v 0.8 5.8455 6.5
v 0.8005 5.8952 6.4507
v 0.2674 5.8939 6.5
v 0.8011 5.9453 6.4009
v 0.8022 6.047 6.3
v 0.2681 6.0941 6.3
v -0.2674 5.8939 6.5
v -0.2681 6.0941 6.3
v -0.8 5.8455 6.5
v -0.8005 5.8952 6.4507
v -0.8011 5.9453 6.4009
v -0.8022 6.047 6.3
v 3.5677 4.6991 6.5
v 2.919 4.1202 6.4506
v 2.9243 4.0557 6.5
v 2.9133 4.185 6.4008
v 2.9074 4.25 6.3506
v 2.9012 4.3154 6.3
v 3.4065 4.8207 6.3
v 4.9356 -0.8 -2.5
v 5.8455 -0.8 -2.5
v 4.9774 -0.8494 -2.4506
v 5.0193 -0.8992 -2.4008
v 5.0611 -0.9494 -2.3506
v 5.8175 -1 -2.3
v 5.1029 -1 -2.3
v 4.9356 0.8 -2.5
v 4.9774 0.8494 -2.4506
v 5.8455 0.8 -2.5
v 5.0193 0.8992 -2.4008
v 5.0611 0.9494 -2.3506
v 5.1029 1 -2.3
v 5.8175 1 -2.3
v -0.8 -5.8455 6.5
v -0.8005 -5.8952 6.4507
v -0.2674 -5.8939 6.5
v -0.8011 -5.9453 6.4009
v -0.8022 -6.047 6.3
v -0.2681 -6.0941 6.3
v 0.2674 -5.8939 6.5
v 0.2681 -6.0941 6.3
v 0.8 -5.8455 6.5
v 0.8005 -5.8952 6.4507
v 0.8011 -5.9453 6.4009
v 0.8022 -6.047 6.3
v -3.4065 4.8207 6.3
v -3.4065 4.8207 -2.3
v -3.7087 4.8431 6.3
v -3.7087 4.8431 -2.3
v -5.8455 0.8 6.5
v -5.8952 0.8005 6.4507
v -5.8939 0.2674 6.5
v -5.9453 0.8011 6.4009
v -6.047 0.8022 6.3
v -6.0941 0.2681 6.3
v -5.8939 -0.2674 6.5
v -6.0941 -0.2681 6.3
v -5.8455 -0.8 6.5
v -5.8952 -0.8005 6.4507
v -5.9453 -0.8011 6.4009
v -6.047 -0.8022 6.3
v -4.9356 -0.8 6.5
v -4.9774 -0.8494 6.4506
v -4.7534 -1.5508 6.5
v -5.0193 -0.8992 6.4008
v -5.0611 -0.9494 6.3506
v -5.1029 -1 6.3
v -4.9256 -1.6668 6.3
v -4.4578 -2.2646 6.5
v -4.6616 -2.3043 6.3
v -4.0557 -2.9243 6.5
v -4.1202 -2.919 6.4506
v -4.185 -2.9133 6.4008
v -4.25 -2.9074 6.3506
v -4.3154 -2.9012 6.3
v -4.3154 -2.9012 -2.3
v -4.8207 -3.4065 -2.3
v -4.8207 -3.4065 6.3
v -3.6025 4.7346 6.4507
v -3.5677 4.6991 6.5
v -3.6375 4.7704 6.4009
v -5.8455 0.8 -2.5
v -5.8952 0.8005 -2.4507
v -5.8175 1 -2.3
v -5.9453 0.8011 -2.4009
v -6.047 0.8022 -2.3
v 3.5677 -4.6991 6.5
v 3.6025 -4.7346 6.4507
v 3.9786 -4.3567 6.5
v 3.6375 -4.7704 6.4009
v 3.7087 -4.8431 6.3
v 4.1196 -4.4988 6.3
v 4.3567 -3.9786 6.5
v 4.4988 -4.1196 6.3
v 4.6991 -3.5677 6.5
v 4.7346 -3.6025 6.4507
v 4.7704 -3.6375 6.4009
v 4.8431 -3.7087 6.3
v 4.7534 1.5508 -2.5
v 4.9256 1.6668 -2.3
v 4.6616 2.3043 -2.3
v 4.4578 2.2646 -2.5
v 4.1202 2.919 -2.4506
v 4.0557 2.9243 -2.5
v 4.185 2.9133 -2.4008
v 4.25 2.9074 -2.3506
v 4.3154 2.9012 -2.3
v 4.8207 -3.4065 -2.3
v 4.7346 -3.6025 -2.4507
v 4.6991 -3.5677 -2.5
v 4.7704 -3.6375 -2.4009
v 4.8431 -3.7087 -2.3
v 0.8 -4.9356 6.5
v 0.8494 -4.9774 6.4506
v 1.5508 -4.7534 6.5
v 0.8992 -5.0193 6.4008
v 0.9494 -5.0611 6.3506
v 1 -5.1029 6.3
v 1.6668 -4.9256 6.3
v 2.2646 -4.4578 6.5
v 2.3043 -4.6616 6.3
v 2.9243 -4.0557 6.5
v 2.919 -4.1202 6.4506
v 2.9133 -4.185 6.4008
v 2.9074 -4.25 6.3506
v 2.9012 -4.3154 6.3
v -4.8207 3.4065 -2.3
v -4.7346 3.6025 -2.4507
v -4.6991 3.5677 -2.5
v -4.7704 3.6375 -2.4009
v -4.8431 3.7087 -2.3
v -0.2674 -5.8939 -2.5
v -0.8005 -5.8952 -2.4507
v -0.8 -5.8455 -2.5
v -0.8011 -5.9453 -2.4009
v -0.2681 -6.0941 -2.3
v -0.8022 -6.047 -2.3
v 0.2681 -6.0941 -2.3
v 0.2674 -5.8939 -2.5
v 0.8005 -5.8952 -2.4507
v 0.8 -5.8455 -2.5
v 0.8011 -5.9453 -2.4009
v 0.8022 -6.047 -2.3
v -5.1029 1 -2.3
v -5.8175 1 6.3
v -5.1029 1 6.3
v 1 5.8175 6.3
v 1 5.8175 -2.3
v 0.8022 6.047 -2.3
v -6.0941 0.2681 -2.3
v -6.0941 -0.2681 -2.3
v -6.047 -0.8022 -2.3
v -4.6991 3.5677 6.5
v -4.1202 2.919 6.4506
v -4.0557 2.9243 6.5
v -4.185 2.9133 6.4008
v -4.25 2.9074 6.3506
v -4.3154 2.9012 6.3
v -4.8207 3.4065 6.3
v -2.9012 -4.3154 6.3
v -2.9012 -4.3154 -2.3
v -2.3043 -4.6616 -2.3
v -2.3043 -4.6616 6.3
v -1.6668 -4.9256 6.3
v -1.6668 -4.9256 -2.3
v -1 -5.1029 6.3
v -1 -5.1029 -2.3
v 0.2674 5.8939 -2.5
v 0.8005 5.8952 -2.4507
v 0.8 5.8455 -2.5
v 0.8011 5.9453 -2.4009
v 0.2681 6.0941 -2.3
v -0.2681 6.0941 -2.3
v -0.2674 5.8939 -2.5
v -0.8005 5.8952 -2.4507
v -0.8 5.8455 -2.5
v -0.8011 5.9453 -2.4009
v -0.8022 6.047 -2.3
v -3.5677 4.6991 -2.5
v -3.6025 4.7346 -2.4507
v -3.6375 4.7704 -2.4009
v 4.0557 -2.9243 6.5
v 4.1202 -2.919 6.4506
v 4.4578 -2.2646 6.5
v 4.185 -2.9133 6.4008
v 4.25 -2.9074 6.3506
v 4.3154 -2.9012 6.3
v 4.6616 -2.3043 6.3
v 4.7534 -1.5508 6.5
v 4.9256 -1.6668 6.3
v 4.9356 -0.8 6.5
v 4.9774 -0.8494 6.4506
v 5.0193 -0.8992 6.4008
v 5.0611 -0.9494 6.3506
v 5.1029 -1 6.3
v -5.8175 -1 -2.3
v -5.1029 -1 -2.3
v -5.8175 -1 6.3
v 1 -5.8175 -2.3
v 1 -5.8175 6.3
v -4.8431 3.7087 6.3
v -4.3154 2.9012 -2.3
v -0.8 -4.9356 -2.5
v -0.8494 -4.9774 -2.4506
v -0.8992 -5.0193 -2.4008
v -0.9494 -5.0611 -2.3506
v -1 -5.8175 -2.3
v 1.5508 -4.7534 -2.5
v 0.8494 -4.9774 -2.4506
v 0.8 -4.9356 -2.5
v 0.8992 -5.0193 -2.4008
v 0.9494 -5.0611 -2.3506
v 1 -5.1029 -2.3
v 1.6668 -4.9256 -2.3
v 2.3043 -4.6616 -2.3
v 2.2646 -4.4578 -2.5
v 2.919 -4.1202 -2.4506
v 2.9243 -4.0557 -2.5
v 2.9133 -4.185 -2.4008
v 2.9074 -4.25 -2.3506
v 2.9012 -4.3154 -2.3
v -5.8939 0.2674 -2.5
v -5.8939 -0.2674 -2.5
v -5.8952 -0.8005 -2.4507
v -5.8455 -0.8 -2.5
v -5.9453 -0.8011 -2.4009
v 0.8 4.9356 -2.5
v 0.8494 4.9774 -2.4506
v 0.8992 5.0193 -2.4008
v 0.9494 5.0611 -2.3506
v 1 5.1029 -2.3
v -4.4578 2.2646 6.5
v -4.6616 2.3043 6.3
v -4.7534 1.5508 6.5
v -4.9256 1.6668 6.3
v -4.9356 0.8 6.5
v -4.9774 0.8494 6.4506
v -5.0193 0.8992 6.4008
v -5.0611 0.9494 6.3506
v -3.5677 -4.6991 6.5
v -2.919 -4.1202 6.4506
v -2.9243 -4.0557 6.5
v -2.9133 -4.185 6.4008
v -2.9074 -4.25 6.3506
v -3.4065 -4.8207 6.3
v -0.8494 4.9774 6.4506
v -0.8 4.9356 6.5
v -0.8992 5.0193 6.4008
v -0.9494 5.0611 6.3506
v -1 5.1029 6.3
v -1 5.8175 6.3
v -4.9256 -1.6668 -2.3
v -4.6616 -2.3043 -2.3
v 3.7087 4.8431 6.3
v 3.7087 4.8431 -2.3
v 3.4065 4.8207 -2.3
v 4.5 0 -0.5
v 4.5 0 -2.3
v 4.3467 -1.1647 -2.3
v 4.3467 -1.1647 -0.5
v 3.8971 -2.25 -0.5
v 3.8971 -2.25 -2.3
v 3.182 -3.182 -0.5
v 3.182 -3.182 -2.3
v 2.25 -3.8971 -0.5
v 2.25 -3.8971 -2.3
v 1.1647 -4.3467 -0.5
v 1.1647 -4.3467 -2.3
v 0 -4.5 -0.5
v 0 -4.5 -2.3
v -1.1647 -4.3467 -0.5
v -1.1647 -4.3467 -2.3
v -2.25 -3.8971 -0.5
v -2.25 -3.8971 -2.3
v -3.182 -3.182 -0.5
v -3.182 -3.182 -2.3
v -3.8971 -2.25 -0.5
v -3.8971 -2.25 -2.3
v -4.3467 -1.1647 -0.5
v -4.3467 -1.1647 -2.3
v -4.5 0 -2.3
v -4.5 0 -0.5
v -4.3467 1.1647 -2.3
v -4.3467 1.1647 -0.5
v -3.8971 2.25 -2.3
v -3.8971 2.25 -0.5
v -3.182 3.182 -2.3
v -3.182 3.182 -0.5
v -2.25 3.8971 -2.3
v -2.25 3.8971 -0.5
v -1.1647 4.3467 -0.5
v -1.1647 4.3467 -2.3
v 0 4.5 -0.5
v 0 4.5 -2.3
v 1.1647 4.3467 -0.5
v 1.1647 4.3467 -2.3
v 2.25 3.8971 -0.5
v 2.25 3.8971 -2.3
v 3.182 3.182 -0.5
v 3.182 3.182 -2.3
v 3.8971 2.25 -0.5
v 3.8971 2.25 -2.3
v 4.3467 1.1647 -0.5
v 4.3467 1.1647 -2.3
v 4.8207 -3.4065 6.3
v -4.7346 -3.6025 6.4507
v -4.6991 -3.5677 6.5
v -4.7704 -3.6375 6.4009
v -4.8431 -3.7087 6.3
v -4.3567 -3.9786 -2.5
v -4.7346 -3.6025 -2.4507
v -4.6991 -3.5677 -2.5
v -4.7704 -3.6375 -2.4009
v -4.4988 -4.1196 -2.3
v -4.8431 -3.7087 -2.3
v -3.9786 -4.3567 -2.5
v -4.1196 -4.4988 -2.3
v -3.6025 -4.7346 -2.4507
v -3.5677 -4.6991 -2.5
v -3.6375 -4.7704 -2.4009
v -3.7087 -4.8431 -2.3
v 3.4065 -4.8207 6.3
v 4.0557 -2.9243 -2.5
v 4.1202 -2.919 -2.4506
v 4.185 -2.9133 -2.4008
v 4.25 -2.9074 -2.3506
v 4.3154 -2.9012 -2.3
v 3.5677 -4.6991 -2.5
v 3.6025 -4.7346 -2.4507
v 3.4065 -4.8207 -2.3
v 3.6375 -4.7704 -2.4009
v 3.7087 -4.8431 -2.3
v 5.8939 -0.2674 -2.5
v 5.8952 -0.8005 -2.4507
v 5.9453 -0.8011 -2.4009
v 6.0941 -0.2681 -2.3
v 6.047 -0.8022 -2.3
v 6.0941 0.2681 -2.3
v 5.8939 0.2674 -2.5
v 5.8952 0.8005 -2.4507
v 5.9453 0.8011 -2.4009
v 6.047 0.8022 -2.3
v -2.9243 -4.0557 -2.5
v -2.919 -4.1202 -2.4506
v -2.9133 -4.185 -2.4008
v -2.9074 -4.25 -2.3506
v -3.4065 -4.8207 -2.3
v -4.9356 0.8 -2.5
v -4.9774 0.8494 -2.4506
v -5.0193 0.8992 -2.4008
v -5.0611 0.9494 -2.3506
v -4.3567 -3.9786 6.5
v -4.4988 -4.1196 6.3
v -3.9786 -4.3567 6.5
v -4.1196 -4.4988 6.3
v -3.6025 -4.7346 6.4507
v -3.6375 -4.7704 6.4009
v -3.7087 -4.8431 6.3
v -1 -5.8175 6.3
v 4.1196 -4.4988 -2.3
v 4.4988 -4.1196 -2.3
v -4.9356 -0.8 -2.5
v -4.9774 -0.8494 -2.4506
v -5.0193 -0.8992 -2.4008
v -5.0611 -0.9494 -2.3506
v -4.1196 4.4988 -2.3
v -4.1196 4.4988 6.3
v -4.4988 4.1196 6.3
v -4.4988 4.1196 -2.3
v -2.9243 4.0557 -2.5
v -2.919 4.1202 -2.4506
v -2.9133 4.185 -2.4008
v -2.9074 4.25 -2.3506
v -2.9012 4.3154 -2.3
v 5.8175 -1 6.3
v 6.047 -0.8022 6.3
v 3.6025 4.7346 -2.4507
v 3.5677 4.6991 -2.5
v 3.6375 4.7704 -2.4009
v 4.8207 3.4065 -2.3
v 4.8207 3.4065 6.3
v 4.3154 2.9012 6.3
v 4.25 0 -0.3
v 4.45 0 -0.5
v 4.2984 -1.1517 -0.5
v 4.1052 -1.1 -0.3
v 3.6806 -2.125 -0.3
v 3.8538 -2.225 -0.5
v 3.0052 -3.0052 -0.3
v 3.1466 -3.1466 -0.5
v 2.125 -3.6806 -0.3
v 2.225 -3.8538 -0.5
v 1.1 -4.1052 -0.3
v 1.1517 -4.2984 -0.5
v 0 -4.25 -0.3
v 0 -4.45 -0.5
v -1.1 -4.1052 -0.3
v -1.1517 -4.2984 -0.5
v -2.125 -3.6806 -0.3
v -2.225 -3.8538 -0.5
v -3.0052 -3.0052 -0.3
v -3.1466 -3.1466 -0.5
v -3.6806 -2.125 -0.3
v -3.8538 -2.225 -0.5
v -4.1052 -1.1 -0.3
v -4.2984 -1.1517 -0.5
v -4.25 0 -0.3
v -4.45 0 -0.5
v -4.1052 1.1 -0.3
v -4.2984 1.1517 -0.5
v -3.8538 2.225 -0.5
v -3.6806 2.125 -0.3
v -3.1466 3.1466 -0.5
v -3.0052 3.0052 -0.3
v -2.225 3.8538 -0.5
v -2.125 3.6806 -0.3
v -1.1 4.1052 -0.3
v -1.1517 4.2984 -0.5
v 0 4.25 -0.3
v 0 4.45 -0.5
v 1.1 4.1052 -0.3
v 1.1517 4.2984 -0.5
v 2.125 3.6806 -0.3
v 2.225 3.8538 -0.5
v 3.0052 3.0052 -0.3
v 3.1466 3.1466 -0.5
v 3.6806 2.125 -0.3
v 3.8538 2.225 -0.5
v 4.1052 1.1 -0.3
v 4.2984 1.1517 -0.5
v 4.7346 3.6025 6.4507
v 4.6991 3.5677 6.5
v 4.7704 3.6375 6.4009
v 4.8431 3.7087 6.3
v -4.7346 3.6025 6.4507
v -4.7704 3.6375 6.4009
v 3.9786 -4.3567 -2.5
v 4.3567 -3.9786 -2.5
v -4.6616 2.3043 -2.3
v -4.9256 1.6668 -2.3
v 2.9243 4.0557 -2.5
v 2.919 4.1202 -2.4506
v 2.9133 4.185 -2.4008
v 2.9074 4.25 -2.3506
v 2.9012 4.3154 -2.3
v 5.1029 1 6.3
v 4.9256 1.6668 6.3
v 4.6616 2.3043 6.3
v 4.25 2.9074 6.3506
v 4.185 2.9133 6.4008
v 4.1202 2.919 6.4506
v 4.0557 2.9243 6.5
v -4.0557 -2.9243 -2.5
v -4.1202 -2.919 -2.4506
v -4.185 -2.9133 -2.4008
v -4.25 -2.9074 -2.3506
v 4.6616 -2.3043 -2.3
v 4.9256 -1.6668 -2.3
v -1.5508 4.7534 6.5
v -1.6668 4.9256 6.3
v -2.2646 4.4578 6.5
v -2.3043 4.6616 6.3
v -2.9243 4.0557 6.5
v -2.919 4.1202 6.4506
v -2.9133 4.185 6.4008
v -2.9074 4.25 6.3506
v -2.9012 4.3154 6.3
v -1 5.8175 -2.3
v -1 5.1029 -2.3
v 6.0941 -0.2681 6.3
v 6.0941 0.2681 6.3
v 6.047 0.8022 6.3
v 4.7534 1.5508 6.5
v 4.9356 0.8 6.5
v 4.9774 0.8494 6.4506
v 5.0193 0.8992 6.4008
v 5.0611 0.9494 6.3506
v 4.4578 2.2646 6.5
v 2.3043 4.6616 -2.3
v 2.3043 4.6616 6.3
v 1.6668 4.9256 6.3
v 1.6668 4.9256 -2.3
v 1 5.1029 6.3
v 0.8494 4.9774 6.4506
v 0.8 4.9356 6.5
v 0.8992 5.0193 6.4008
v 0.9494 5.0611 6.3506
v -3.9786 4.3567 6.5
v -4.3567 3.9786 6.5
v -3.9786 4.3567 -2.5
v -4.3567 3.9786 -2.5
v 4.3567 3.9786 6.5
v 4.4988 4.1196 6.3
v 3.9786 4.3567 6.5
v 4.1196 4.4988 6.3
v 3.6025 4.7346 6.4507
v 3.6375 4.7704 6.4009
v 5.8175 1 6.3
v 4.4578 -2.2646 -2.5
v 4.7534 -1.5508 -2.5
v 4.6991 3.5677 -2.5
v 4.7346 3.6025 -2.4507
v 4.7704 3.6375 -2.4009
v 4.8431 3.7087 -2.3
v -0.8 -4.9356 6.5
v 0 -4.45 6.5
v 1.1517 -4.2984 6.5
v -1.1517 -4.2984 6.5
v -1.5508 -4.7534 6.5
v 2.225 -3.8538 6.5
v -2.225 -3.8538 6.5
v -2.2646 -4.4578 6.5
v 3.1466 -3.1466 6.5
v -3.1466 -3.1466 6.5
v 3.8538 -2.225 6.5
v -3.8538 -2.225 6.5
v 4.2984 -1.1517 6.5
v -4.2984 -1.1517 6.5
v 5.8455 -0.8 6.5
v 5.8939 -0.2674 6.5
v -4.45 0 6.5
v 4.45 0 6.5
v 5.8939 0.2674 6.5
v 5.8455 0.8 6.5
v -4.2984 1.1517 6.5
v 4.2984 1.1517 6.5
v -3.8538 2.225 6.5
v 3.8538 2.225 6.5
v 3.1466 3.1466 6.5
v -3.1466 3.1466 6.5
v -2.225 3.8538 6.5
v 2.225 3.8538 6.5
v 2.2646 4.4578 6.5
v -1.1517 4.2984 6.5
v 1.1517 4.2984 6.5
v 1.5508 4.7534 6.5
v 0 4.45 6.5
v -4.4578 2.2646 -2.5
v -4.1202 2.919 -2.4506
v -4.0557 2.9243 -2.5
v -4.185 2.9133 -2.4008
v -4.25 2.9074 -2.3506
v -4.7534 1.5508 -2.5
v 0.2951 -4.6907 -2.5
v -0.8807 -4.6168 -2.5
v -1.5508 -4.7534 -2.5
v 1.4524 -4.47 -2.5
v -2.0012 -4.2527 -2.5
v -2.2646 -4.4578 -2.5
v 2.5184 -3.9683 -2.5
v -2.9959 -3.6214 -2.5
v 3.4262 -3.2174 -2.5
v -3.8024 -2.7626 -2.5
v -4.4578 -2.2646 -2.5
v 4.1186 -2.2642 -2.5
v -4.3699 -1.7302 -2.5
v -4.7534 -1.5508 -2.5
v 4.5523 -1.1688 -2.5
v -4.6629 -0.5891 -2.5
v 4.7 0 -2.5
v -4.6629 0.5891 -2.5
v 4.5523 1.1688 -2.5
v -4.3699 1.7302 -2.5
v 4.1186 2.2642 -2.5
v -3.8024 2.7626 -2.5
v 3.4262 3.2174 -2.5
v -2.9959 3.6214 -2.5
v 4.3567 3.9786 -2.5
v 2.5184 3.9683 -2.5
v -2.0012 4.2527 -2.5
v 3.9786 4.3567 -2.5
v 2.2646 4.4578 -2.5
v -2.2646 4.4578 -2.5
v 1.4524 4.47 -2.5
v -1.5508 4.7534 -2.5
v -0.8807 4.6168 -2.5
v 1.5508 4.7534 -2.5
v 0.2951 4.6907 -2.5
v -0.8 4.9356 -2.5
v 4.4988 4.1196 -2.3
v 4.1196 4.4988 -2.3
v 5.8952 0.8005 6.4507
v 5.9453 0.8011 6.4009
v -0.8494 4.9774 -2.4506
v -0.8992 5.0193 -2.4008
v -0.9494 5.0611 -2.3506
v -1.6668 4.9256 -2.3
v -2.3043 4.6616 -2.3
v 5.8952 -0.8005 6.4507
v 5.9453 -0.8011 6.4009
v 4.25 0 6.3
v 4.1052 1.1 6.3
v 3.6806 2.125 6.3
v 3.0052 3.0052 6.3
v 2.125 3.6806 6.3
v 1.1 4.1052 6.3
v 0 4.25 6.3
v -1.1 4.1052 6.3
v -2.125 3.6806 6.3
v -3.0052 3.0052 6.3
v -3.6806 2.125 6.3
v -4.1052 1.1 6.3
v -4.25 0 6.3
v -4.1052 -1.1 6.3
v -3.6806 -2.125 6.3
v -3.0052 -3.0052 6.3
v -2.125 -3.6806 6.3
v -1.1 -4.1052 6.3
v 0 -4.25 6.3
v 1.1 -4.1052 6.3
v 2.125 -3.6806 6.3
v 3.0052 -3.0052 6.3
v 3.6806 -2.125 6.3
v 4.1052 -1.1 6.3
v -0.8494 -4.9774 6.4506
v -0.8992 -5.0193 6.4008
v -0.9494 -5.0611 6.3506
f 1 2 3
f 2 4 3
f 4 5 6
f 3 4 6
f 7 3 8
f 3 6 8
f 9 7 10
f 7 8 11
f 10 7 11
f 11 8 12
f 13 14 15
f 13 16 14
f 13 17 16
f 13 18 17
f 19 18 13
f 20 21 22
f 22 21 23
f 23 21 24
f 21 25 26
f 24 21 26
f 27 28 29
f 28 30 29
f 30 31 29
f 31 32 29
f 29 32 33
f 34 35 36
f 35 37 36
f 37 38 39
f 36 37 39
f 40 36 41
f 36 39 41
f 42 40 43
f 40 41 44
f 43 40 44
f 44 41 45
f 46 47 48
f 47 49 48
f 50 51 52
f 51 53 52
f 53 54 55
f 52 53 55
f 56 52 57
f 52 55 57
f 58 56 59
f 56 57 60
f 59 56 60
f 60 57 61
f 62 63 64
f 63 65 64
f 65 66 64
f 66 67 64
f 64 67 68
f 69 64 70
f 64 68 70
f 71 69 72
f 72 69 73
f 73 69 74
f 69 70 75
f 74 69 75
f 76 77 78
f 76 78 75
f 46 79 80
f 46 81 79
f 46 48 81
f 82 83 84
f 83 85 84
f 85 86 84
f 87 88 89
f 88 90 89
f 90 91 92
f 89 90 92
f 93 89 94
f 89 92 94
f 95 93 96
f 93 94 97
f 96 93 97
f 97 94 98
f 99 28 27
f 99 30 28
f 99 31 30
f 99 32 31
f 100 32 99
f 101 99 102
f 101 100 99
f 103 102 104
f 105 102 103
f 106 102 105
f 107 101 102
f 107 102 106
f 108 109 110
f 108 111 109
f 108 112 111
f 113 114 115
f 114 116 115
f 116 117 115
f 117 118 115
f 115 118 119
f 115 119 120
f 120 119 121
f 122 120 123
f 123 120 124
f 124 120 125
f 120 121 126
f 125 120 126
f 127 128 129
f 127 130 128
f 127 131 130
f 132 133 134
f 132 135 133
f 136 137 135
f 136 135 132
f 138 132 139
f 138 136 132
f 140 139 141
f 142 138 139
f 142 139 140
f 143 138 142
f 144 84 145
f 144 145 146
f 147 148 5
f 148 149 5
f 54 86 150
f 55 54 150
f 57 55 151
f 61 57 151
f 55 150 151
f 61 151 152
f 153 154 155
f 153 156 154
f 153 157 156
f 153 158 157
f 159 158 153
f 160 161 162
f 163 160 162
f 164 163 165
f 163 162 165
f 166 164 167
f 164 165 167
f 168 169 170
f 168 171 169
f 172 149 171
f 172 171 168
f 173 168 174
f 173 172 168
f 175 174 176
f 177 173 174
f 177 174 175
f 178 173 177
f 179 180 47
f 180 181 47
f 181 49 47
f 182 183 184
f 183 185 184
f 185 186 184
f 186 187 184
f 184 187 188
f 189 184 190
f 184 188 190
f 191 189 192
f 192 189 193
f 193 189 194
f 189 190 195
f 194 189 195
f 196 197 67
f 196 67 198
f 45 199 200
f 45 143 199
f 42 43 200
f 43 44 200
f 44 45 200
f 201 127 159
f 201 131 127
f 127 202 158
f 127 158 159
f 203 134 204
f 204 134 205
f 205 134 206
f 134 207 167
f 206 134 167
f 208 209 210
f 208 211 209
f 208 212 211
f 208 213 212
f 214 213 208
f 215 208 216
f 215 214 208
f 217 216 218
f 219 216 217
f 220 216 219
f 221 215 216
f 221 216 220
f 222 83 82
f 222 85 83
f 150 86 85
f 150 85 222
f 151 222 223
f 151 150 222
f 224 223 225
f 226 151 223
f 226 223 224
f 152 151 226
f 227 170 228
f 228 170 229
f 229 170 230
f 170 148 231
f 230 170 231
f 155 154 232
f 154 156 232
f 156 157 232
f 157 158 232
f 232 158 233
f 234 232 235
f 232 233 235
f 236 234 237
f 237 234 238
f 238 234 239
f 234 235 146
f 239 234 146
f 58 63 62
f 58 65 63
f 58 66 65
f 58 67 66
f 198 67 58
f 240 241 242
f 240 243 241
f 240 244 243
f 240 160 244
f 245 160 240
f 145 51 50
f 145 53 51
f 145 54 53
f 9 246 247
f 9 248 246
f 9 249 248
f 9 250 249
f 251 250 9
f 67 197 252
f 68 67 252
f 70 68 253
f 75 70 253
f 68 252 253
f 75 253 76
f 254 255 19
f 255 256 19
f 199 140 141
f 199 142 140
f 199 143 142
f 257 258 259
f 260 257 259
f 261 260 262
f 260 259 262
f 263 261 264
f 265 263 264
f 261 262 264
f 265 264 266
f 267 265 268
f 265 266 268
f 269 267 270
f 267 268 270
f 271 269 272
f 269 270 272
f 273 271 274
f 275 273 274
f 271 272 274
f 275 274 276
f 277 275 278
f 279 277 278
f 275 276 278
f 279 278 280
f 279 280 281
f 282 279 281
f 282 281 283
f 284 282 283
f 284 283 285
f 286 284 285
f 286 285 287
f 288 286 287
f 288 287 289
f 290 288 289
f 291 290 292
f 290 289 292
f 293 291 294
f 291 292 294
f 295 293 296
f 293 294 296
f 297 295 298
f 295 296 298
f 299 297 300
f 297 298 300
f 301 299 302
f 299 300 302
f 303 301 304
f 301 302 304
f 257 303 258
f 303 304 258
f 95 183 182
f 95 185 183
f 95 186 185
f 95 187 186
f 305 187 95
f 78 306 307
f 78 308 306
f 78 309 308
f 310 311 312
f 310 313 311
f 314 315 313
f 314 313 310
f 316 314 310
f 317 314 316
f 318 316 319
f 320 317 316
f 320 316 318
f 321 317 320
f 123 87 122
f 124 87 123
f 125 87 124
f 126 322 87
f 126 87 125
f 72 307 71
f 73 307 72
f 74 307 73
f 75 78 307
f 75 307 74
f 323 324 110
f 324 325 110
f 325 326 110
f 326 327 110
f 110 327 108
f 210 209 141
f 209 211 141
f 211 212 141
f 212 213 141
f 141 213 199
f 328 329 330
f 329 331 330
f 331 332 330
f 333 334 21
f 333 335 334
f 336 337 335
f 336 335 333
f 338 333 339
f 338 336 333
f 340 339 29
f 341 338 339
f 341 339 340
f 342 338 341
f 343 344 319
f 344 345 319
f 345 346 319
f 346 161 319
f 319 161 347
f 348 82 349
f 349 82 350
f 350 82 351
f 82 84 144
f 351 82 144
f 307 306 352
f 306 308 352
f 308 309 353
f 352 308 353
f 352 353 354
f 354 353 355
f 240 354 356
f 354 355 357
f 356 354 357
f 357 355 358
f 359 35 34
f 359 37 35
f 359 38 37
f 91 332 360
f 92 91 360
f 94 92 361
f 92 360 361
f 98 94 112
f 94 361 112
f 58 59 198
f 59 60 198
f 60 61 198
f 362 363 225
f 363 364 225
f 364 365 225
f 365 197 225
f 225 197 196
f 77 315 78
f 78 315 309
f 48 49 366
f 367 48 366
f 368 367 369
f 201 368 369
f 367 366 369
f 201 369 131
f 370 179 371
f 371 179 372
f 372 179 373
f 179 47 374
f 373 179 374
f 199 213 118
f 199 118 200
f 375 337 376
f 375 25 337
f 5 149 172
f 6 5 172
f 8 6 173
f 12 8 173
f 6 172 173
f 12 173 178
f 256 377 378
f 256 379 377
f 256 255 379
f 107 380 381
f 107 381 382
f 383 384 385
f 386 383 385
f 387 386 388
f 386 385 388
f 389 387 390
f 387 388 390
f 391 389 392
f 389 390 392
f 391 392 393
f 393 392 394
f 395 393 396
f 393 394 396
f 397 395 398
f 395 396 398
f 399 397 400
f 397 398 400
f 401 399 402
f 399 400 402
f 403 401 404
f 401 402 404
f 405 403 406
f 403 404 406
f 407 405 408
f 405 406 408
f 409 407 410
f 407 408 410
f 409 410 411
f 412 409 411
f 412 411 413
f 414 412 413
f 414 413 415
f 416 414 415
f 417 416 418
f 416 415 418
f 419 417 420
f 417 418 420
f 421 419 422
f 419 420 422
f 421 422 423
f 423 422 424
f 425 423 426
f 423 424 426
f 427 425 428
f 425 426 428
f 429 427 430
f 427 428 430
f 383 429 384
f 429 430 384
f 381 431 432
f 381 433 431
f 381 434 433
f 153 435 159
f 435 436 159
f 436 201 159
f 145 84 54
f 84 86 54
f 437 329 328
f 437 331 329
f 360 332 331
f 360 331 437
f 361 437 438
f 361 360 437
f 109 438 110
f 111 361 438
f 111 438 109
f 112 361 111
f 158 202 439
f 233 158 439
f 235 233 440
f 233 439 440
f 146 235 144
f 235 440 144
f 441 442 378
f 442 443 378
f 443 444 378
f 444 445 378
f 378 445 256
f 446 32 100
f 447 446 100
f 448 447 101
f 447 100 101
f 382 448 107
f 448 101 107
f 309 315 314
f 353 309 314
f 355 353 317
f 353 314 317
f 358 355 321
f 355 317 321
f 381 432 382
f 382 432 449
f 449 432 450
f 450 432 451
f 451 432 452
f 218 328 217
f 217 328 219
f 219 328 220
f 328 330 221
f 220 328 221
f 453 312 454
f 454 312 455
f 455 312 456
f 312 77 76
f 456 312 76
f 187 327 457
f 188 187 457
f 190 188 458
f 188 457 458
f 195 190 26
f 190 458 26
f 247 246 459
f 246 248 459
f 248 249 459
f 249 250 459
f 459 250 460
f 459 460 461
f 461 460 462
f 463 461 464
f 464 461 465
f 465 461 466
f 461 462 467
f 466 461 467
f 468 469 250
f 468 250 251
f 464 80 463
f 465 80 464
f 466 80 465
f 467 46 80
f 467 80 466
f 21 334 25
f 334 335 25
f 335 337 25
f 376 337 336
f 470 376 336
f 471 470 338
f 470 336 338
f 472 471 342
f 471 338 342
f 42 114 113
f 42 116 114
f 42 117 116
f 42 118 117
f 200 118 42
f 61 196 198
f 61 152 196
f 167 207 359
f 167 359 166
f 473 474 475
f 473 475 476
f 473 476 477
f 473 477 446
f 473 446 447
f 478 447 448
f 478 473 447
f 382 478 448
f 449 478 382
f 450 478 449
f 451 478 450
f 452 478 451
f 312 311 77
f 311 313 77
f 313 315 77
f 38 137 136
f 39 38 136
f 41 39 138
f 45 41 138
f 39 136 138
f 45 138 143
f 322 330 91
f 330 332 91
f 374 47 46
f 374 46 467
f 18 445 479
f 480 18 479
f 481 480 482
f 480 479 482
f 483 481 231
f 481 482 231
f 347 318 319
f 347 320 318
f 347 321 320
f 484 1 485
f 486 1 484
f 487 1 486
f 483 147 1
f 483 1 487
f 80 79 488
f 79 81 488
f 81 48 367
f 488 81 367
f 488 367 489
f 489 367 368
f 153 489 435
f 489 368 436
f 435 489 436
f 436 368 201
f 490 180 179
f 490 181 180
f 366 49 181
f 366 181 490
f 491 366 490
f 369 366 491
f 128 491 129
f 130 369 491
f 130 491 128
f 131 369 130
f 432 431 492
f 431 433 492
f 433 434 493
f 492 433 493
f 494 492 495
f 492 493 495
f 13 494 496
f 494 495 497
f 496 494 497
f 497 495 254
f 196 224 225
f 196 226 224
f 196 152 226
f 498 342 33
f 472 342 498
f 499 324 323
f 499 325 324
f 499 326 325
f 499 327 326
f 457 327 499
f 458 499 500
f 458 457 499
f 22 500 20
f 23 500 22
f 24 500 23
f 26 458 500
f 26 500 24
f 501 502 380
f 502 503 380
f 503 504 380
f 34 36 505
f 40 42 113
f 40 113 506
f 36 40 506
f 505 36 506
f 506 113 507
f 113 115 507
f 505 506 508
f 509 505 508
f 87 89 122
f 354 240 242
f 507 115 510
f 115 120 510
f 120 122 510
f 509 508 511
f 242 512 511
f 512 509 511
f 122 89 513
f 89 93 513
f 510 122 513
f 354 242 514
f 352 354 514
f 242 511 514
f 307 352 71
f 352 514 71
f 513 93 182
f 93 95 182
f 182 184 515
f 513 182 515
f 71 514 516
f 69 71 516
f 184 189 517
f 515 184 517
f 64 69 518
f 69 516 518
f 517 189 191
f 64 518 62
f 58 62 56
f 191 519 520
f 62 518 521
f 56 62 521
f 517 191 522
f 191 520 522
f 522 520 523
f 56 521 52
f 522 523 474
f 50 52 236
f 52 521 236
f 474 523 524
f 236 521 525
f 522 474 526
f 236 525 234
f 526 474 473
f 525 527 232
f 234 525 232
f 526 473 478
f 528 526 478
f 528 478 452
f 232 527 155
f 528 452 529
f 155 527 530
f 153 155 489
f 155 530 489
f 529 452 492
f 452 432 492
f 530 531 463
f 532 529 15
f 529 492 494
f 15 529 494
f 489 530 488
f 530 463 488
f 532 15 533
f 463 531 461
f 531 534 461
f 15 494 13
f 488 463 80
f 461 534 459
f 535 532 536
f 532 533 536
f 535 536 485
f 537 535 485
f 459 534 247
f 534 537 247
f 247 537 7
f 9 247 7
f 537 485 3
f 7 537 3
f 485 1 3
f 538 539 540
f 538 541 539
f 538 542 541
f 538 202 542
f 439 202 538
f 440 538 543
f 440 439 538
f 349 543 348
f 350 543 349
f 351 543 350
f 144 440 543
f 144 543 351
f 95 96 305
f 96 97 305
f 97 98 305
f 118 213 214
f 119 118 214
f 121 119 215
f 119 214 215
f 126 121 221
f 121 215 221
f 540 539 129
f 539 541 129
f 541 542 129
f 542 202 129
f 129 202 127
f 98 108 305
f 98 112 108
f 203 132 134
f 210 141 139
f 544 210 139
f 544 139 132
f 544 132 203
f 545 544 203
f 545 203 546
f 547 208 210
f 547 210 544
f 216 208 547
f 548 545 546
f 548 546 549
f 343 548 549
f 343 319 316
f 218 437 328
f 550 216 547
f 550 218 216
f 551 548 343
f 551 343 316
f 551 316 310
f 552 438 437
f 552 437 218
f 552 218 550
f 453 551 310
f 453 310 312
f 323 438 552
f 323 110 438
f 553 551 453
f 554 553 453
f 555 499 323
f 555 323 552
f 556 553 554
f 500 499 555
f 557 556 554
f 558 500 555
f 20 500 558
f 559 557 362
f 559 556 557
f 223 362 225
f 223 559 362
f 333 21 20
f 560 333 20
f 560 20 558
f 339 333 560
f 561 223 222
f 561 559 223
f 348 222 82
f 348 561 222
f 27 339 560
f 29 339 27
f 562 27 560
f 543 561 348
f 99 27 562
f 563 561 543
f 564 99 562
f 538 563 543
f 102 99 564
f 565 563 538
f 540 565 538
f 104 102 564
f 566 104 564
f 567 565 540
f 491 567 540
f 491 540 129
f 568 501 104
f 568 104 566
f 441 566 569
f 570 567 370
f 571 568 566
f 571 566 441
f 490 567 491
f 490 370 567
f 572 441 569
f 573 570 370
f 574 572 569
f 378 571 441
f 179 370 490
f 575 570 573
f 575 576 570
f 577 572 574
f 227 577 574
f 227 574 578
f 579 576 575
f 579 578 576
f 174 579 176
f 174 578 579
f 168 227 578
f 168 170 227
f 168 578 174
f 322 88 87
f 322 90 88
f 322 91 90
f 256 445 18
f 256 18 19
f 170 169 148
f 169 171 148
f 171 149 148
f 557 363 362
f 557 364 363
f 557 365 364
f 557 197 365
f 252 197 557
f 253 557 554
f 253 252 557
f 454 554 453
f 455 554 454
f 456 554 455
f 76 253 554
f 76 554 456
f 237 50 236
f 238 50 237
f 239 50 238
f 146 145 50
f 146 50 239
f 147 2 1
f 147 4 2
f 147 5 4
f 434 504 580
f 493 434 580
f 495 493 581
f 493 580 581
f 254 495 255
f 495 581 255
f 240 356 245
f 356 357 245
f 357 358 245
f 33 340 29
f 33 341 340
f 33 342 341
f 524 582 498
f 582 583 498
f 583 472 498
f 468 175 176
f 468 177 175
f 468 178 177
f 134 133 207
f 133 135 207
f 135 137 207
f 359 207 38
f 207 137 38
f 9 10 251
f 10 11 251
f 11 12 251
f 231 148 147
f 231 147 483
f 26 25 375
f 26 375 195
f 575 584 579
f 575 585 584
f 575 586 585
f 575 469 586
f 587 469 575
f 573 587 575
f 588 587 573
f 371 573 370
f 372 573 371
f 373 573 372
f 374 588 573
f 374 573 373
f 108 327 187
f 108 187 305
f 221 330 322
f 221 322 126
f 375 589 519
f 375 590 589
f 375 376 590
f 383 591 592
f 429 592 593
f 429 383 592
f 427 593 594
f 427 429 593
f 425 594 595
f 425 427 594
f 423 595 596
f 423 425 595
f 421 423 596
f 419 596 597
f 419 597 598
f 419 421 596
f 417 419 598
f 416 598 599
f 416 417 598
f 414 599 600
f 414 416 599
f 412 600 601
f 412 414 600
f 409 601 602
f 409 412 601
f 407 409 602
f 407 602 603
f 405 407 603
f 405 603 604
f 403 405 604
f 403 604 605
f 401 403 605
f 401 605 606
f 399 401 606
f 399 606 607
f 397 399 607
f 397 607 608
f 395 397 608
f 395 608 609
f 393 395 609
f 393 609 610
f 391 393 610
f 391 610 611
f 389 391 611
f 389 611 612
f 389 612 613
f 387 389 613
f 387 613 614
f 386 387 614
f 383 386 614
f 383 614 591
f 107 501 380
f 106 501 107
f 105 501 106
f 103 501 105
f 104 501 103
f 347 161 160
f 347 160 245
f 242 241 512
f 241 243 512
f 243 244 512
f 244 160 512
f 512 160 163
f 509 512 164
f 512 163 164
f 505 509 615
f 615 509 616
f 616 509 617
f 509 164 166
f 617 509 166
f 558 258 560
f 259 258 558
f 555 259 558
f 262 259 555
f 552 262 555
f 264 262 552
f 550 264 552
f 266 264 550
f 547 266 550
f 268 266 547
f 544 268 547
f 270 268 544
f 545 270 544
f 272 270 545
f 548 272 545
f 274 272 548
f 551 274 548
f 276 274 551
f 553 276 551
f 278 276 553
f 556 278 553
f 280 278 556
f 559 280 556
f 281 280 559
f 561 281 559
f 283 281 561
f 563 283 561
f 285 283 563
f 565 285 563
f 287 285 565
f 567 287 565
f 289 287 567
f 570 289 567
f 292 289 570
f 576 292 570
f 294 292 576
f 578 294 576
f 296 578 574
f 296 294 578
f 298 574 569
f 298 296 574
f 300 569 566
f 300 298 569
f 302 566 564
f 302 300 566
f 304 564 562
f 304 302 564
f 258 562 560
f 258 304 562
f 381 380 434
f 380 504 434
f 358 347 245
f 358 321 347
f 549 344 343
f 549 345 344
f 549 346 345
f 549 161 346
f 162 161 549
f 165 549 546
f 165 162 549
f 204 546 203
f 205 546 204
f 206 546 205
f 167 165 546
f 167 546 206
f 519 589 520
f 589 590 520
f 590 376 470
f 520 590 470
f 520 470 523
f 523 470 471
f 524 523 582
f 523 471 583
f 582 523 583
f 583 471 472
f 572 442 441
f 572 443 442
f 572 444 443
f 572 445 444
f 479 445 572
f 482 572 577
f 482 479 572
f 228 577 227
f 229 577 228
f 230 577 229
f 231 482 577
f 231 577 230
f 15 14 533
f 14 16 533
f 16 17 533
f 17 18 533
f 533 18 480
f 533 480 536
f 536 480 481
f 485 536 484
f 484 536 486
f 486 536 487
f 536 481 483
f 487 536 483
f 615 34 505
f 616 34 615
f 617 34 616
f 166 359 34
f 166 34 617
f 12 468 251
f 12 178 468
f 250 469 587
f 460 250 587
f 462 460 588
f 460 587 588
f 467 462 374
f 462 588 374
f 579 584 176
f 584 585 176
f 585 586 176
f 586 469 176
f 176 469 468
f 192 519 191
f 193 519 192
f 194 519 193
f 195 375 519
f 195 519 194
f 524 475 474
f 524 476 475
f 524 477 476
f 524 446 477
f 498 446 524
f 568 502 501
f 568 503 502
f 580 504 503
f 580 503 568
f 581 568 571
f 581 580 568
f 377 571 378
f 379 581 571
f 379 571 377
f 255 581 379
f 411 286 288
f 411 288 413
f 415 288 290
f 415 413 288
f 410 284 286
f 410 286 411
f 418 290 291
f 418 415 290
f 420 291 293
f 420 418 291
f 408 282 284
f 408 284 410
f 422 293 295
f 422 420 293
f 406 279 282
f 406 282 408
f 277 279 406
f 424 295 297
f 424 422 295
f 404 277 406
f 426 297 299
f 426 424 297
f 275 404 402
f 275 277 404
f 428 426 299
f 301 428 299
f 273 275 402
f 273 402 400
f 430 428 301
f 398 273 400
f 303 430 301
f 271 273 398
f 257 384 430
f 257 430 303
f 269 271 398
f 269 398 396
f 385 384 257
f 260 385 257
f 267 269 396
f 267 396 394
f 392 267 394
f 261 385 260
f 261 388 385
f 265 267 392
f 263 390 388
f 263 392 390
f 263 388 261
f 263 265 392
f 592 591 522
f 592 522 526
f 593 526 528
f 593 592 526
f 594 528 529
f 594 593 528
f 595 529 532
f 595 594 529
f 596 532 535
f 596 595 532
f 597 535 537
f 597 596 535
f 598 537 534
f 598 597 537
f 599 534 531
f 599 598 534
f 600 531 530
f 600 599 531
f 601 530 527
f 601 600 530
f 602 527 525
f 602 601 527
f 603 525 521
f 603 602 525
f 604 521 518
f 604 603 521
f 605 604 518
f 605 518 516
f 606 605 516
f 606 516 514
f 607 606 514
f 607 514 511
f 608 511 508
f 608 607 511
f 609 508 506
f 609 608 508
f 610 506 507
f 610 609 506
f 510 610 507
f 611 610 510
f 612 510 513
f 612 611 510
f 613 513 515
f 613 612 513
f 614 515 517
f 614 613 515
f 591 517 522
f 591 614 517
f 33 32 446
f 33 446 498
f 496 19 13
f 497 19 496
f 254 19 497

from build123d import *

# Parameters (mm, degrees)
PAD010_DEPTH    = 9
ARRAY001_COUNT  = 8
SKETCH014_R     = 5.2
SKETCH014_R_2   = 4.25
PAD009_DEPTH    = 9
SKETCH017_R     = 4.5
POCKET005_DEPTH = 2
CHAMFER004_SIZE = 0.2


with BuildPart() as array001:
    # Sketch015 → Pad010 (new body)
    with BuildSketch(Plane.XY):
        with BuildLine():
            Line((1, 6.0174745533), (1, 4.7674745533))
            Line((1, 4.7674745533), (-1, 4.7674745533))
            Line((-1, 4.7674745533), (-1, 6.0174745533))
            ThreePointArc((1, 6.0174745533), (0, 6.1), (-1, 6.0174745533))
        make_face()
    extrude(amount=PAD010_DEPTH)


with BuildPart() as array001_1:
    # Body005 placement: moved
    add(array001.part.moved(Location((0, 0, -3))))

    # Array001: Array001 ×8 about axis
    array001_axis = Axis((0, 0, 0), (0, 0, 1))


with BuildPart() as array001_2:
    add(array001_1.part)
    for i in range(1, ARRAY001_COUNT):
        add(array001_1.part.rotate(array001_axis, i * 360 / ARRAY001_COUNT))


with BuildPart() as chamfer004:
    # Sketch014 → Pad009 (new body)
    with BuildSketch(Plane.XY):
        Circle(SKETCH014_R)
        Circle(SKETCH014_R_2, mode=Mode.SUBTRACT)
    extrude(amount=PAD009_DEPTH)

    # Sketch017 (on Face3 of Pad009) → Pocket005 (cut)
    with BuildSketch(Plane(origin=(0, 0, 0), x_dir=(1, 0, 0), z_dir=(0, 0, -1))):
        Circle(SKETCH017_R)
    extrude(amount=-POCKET005_DEPTH, mode=Mode.SUBTRACT)


with BuildPart() as chamfer004_1:
    # Body004 placement: moved
    add(chamfer004.part.moved(Location((0, 0, -3))))

    # Fusion: union Array001
    add(array001_2.part)

    # Chamfer004
    chamfer004_edges = [chamfer004_1.edges().sort_by_distance(p)[0] for p in [
        (1.989954, 4.804174, -3),
        (1.989954, 4.804174, 6),
        (1, 5.560207, -3),
        (1, 5.560207, 6),
        (1, 6.017475, 1.5),
        (3.224554, 4.638767, -3),
        (3.54789, 4.962104, 1.5),
        (3.224554, 4.638767, 6),
        (-1, 6.017475, 1.5),
        (0, 6.1, -3),
        (0, 6.1, 6),
        (-1.989954, 4.804174, -3),
        (-1.989954, 4.804174, 6),
        (-3.224554, 4.638767, -3),
        (-3.224554, 4.638767, 6),
        (-3.54789, 4.962104, 1.5),
        (-1, 5.560207, -3),
        (-1, 5.560207, 6),
        (-4.962104, 3.54789, 1.5),
        (-4.313351, 4.313351, -3),
        (-4.313351, 4.313351, 6),
        (-4.804174, 1.989954, -3),
        (-4.804174, 1.989954, 6),
        (-5.560207, 1, -3),
        (-5.560207, 1, 6),
        (-6.017475, 1, 1.5),
        (-4.638767, 3.224554, -3),
        (-4.638767, 3.224554, 6),
        (-6.017475, -1, 1.5),
        (-6.1, 0, -3),
        (-6.1, 0, 6),
        (-4.804174, -1.989954, 6),
        (-4.804174, -1.989954, -3),
        (-4.638767, -3.224554, -3),
        (-4.638767, -3.224554, 6),
        (-4.962104, -3.54789, 1.5),
        (-5.560207, -1, -3),
        (-5.560207, -1, 6),
        (-3.54789, -4.962104, 1.5),
        (-4.313351, -4.313351, -3),
        (-4.313351, -4.313351, 6),
        (-1.989954, -4.804174, 6),
        (-1.989954, -4.804174, -3),
        (-1, -5.560207, -3),
        (-1, -5.560207, 6),
        (-1, -6.017475, 1.5),
        (-3.224554, -4.638767, -3),
        (-3.224554, -4.638767, 6),
        (1, -6.017475, 1.5),
        (0, -6.1, -3),
        (0, -6.1, 6),
        (1.989954, -4.804174, 6),
        (1.989954, -4.804174, -3),
        (3.224554, -4.638767, -3),
        (3.224554, -4.638767, 6),
        (3.54789, -4.962104, 1.5),
        (1, -5.560207, -3),
        (1, -5.560207, 6),
        (4.962104, -3.54789, 1.5),
        (4.313351, -4.313351, -3),
        (4.313351, -4.313351, 6),
        (5.560207, -1, -3),
        (5.560207, -1, 6),
        (6.017475, -1, 1.5),
        (6.017475, 1, 1.5),
        (6.1, 0, -3),
        (6.1, 0, 6),
        (5.560207, 1, -3),
        (5.560207, 1, 6),
        (4.804174, -1.989954, 6),
        (4.804174, -1.989954, -3),
        (4.804174, 1.989954, -3),
        (4.804174, 1.989954, 6),
        (4.638767, -3.224554, -3),
        (4.638767, -3.224554, 6),
        (4.638767, 3.224554, -3),
        (4.638767, 3.224554, 6),
        (4.962104, 3.54789, 1.5),
        (4.313351, 4.313351, -3),
        (4.313351, 4.313351, 6),
        (-4.5, 0, -3),
        (-4.25, 0, -1),
        (-4.25, 0, 6),
    ]]
    chamfer(chamfer004_edges, length=CHAMFER004_SIZE)


with BuildPart() as chamfer004_2:
    # Chamfer004 placement: moved
    add(chamfer004_1.part.moved(Location((0, 0, 0.5))))


solid = chamfer004_2.part
